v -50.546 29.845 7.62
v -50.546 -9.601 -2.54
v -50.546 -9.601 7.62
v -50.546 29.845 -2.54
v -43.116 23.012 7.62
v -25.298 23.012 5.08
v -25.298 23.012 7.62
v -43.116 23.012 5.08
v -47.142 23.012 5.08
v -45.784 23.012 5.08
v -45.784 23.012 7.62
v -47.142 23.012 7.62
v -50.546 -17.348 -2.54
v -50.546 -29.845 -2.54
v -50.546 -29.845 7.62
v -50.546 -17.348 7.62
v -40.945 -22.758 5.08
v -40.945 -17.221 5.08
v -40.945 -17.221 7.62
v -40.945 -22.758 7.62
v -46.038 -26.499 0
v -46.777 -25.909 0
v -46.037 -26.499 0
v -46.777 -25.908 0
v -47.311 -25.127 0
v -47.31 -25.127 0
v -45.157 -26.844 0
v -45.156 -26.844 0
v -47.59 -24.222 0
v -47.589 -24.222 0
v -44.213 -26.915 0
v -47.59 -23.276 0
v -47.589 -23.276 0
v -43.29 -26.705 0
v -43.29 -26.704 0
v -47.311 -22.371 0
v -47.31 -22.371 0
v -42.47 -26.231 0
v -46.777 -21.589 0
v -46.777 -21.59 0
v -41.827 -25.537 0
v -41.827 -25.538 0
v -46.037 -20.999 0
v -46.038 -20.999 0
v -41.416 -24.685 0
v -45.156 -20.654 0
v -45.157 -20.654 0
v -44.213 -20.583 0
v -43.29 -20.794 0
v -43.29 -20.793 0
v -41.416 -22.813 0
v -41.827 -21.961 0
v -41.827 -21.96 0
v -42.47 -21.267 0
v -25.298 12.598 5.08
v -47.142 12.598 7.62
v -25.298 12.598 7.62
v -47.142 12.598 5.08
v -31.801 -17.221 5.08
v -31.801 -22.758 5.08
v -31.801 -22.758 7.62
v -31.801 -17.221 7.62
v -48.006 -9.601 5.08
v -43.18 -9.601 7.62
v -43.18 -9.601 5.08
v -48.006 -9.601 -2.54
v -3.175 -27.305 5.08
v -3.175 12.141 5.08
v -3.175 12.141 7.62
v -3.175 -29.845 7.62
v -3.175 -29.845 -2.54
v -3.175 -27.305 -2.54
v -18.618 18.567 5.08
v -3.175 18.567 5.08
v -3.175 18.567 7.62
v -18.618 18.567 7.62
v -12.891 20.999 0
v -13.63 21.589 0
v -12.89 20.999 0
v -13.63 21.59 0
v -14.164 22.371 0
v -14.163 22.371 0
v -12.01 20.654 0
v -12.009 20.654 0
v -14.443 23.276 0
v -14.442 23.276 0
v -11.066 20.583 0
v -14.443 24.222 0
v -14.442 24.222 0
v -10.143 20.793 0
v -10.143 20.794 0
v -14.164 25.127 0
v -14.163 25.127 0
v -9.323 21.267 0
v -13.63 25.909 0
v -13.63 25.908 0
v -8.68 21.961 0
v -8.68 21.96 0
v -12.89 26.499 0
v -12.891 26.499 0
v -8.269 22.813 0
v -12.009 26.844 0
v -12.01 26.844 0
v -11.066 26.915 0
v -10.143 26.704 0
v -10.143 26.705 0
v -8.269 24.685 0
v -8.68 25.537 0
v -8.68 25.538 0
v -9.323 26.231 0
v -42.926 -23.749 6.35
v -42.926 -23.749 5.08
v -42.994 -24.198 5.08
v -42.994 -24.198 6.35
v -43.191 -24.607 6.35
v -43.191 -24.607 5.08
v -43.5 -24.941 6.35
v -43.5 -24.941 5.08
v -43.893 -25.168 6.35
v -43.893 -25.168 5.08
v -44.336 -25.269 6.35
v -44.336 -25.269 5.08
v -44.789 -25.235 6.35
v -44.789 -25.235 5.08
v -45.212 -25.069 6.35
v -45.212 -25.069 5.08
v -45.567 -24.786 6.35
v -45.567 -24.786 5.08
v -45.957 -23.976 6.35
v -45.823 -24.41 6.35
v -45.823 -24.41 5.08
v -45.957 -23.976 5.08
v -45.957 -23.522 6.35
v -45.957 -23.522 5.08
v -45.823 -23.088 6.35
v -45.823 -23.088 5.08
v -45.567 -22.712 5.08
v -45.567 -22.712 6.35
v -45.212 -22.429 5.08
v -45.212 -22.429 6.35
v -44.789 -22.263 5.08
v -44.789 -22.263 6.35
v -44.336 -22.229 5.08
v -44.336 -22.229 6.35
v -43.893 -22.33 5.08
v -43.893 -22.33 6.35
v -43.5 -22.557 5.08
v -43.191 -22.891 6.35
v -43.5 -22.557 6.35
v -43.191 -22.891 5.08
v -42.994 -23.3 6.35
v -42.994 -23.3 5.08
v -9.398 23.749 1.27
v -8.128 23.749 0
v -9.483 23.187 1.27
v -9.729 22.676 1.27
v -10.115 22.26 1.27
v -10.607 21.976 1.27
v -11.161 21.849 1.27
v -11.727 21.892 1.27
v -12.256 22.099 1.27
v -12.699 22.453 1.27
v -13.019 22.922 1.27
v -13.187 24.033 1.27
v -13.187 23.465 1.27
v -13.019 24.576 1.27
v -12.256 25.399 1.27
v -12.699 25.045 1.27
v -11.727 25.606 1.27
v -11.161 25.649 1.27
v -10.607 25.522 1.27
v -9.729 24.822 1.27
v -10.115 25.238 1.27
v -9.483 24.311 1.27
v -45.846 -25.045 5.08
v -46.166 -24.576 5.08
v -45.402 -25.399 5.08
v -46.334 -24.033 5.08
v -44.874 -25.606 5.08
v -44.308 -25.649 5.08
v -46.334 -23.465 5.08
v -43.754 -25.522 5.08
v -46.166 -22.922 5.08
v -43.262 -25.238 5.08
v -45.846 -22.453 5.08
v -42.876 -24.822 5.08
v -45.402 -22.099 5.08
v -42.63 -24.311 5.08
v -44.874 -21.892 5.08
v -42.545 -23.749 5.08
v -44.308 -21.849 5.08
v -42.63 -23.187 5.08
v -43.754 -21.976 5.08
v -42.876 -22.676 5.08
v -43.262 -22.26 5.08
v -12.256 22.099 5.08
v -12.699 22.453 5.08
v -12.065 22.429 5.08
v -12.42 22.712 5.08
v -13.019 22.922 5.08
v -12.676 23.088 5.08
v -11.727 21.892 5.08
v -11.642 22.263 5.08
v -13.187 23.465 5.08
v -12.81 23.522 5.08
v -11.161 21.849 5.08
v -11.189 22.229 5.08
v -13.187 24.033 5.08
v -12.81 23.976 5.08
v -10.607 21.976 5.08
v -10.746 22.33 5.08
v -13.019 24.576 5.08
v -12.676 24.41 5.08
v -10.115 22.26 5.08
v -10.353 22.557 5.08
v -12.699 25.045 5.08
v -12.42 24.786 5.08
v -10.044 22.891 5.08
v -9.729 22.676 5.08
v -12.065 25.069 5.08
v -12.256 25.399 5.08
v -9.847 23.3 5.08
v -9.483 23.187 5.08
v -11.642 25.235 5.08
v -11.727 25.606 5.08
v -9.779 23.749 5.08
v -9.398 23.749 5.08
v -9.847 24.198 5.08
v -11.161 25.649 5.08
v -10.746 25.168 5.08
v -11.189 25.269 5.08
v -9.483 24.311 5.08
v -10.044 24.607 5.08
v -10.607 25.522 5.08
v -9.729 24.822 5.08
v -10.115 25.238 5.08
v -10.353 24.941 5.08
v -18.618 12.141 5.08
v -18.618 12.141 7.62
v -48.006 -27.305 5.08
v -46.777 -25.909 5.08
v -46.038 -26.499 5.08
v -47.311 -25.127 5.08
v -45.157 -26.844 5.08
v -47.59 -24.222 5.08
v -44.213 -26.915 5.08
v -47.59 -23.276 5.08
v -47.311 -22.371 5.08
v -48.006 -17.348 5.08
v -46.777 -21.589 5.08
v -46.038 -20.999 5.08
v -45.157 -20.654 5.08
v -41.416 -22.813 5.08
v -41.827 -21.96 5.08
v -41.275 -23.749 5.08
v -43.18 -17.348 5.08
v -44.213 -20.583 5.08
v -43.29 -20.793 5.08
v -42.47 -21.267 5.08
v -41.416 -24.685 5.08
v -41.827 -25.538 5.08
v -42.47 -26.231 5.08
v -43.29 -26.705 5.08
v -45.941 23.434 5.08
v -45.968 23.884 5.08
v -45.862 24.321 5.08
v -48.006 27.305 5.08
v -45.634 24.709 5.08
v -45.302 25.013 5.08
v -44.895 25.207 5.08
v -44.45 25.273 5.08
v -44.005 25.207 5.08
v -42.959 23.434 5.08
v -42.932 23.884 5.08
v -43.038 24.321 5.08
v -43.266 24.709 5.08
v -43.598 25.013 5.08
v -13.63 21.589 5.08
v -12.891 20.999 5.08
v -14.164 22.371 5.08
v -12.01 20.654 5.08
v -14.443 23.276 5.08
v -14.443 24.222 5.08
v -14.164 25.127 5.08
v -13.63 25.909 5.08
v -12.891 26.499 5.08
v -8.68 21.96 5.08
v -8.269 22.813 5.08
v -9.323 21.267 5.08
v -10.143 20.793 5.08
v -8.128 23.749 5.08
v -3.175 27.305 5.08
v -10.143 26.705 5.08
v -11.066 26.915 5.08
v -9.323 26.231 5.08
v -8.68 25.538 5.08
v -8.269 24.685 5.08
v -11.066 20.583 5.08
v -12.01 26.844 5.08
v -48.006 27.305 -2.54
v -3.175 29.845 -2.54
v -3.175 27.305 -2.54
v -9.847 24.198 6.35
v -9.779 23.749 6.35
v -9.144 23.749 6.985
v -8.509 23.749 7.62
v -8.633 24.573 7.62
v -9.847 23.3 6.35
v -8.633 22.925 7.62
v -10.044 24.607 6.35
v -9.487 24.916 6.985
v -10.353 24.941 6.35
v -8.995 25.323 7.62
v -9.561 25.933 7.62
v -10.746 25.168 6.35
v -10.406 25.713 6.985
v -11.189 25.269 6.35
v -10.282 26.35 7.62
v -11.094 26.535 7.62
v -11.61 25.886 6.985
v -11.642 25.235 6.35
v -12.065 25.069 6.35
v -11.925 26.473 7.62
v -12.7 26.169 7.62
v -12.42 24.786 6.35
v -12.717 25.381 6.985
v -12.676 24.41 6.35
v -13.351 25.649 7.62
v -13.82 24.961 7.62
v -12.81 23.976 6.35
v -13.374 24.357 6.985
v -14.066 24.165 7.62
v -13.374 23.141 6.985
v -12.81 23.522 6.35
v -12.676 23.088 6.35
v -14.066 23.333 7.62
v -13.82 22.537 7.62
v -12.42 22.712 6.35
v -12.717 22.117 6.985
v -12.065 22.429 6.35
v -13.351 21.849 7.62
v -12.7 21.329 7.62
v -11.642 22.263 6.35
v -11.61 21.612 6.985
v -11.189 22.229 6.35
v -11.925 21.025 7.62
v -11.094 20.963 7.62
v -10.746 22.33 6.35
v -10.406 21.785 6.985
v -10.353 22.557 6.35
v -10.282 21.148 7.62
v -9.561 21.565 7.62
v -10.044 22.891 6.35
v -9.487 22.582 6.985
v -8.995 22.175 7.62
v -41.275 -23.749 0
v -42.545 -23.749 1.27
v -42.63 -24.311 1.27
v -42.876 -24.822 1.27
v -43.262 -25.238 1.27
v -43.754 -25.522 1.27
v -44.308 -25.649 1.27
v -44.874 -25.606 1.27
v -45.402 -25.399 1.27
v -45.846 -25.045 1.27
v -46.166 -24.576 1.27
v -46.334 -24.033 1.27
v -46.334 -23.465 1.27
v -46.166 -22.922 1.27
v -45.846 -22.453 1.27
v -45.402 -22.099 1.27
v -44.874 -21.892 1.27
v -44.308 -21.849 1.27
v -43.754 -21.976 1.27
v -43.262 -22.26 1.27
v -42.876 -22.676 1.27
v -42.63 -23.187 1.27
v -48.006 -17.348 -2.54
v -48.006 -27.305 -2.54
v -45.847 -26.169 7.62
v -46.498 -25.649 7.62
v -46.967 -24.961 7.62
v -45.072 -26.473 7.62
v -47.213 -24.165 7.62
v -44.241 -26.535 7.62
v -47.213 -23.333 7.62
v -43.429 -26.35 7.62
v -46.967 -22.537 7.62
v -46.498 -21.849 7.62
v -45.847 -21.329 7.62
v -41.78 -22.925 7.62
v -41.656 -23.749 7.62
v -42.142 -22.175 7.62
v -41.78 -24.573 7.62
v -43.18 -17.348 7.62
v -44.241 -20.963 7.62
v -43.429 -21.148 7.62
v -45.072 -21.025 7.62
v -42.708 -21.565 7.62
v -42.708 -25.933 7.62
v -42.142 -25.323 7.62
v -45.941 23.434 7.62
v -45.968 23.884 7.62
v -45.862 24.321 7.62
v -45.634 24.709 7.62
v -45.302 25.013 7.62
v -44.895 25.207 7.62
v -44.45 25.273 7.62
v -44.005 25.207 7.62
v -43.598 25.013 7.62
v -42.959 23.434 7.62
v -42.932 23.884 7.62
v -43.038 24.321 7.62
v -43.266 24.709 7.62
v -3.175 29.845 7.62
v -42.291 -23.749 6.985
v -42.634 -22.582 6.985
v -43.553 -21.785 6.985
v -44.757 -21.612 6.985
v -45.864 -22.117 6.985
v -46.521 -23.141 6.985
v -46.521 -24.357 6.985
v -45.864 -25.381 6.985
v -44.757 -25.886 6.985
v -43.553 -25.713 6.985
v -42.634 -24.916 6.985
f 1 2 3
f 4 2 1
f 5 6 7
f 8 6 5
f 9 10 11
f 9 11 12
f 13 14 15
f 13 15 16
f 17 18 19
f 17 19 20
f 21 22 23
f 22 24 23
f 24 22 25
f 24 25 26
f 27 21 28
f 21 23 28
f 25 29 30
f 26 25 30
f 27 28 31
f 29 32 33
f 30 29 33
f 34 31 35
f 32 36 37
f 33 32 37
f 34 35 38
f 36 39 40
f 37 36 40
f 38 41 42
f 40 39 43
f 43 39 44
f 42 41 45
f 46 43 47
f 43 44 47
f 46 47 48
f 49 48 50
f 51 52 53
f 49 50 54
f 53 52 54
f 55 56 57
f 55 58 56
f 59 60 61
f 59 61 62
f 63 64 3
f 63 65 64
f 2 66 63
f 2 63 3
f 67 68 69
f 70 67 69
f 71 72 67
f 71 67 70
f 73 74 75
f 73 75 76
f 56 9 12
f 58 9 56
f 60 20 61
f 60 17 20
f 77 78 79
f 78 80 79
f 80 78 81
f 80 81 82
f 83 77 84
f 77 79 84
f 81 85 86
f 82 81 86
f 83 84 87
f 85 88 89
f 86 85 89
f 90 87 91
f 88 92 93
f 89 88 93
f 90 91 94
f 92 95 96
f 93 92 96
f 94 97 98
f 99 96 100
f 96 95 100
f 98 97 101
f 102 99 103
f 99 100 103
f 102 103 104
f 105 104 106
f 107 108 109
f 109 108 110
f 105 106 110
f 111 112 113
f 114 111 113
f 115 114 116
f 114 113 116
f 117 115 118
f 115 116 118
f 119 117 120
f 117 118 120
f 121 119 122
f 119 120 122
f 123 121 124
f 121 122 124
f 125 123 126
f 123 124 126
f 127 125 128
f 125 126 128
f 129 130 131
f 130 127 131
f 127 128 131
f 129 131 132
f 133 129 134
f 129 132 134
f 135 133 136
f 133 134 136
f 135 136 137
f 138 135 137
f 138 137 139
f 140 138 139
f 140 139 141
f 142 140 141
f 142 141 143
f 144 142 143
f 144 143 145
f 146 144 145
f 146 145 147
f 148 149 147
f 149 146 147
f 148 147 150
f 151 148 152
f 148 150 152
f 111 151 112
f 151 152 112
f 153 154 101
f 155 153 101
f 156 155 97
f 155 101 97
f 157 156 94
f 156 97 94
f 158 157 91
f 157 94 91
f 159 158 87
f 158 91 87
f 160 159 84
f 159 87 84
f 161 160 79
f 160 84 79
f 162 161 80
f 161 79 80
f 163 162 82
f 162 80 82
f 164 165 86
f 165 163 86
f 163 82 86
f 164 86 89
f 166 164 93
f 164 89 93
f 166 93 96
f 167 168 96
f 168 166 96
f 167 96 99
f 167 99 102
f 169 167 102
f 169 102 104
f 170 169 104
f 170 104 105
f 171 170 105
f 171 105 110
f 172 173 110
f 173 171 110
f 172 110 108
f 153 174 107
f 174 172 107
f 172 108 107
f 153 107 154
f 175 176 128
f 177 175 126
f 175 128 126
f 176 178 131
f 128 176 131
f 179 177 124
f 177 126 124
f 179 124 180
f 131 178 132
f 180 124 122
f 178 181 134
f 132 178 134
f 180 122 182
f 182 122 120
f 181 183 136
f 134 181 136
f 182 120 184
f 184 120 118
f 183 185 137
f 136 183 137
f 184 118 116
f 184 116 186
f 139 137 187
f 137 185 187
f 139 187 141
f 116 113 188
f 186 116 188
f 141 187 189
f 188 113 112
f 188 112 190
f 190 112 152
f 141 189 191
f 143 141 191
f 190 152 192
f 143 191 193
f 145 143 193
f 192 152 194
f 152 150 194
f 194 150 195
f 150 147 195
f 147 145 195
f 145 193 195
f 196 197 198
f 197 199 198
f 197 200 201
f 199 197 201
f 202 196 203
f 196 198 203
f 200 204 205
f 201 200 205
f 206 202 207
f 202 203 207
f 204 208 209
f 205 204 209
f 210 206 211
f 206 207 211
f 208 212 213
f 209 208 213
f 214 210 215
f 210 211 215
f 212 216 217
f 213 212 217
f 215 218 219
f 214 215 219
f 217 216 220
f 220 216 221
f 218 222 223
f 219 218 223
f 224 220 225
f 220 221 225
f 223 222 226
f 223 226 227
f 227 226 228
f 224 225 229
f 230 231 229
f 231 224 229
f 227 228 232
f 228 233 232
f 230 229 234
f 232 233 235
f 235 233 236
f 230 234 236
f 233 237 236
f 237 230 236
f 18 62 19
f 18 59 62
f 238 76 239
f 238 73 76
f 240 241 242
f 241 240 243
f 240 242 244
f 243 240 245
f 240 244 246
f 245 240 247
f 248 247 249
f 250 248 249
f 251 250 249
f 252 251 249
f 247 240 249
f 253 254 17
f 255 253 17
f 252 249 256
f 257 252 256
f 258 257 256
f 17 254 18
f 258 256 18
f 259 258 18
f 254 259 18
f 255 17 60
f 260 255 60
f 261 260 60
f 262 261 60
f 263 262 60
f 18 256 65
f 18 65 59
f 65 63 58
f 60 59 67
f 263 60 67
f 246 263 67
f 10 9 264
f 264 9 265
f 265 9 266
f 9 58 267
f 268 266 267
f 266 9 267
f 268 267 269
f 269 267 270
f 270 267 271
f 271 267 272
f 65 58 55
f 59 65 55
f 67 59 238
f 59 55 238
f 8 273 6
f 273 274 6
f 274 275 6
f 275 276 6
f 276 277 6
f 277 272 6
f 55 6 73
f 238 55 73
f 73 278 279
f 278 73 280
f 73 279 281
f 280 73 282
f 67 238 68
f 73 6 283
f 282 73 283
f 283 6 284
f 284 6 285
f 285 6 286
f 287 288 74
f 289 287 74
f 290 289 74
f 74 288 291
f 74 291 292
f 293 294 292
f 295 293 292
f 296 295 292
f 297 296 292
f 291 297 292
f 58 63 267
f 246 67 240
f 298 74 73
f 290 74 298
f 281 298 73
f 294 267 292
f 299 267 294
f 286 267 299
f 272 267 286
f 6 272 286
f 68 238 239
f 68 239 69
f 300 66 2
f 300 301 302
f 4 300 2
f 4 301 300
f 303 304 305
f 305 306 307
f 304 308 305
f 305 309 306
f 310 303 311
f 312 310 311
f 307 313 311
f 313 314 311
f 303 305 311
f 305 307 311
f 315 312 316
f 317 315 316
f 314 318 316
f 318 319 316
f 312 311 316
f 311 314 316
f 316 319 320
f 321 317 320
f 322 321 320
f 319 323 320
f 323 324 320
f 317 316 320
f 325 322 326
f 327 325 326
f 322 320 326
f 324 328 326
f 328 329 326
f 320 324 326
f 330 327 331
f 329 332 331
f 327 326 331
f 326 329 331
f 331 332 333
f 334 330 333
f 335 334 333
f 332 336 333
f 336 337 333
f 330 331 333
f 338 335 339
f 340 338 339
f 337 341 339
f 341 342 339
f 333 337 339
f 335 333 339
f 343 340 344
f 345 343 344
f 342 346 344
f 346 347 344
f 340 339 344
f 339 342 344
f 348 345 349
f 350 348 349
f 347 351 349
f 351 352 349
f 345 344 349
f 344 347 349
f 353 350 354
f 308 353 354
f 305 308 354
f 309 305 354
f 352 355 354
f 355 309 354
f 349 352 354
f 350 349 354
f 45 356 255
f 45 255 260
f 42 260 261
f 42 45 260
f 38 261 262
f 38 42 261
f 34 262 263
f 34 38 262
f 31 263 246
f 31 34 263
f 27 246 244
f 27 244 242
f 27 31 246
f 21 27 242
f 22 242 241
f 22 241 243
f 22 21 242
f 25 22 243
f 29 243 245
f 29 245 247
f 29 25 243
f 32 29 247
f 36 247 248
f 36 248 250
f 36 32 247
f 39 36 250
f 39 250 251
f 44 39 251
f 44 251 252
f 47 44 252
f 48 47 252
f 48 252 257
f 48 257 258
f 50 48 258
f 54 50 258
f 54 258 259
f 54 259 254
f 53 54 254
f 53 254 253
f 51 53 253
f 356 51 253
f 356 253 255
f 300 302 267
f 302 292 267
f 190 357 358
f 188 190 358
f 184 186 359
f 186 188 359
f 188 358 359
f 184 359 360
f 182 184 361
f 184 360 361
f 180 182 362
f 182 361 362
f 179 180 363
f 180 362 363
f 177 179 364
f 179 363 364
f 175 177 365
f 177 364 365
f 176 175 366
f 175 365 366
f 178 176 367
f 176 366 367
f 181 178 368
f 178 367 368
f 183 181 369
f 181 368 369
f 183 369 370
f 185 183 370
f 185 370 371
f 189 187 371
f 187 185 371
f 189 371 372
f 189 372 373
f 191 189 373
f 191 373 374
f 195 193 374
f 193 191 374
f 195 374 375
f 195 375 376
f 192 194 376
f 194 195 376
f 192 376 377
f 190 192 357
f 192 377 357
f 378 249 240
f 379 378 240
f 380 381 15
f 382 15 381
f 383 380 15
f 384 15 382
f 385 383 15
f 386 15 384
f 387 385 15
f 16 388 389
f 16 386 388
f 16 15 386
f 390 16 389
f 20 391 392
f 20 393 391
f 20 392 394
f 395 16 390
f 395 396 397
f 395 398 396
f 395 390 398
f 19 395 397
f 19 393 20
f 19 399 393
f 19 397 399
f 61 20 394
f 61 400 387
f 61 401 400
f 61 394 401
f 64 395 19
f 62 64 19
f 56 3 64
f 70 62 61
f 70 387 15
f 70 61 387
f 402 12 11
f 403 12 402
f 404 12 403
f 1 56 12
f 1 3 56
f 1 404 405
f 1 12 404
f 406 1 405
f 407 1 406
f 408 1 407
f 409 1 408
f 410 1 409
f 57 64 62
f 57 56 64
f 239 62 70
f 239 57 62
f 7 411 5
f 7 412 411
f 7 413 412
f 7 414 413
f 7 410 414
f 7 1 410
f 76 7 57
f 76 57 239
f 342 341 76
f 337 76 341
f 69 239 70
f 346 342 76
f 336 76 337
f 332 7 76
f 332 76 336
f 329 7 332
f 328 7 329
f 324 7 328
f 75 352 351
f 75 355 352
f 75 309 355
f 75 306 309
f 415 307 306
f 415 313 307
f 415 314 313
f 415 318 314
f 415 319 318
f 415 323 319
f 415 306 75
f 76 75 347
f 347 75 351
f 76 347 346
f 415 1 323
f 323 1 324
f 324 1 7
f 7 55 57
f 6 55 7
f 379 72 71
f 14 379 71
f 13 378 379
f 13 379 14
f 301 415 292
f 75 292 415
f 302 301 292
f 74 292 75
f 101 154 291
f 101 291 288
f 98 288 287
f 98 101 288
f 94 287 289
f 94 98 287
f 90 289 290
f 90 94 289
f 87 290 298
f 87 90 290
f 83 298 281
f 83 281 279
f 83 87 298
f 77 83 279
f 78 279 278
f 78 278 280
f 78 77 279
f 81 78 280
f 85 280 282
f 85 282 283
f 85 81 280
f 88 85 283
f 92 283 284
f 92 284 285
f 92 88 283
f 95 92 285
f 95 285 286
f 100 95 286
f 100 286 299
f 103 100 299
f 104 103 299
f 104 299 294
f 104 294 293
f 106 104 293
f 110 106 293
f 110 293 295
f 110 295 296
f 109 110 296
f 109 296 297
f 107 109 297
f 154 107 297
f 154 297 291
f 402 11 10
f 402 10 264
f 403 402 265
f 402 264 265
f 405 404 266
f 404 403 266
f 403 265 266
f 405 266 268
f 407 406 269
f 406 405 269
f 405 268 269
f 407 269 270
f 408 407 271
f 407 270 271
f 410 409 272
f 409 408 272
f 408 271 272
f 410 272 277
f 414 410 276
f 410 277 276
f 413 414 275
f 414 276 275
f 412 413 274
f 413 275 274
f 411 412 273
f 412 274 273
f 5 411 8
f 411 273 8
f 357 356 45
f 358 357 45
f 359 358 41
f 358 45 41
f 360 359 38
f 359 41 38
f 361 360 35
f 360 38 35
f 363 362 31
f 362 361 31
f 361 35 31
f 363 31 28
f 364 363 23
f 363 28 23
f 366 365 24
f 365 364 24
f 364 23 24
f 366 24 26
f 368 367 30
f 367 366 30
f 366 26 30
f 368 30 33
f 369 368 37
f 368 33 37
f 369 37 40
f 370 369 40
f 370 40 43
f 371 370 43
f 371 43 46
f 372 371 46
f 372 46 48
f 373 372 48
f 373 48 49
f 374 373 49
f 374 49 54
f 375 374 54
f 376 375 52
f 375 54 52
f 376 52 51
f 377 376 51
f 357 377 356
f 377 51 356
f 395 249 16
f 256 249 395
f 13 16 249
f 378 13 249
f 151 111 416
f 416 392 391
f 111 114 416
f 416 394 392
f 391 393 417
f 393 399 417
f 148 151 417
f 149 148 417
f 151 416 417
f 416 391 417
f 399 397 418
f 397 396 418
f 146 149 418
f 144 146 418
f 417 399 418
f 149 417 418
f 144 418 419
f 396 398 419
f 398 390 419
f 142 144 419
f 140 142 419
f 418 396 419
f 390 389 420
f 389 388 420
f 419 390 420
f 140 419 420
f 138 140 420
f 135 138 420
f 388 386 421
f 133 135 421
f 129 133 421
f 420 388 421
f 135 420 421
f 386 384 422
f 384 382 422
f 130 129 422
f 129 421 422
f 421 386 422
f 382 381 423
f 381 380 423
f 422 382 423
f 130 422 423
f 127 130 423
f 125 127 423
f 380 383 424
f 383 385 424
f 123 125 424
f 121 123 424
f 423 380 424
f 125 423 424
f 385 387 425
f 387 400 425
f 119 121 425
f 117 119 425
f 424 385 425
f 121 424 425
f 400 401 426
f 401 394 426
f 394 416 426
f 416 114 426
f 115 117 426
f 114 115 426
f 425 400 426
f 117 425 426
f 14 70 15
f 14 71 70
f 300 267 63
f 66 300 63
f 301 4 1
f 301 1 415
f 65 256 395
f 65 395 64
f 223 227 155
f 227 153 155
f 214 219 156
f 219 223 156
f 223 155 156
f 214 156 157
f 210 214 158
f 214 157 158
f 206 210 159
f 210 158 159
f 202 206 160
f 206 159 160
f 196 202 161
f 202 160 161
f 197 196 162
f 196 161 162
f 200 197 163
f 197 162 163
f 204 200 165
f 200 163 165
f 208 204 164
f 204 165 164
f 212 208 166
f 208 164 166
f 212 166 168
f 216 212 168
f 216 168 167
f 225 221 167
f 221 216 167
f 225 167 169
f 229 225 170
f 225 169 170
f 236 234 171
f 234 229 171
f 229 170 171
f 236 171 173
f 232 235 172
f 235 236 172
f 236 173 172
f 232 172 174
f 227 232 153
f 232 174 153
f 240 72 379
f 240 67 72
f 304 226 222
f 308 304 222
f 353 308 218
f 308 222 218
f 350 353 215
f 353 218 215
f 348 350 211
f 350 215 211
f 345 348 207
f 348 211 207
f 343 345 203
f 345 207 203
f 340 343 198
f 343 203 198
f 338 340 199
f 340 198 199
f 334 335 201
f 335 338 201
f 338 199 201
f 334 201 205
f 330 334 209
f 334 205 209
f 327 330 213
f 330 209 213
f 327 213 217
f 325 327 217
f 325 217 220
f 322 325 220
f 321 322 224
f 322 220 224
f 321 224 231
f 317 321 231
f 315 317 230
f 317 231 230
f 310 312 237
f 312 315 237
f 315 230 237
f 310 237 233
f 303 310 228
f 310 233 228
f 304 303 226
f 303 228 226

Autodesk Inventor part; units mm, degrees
ref_plane "YZ Plane" through (0, 0, 0) normal (1, 0, 0) x (0, 1, 0)
ref_plane "XZ Plane" through (0, 0, 0) normal (0, 1, 0) x (-1, 0, 0)
ref_plane "XY Plane" through (0, 0, 0) normal (0, 0, 1) x (1, 0, 0)
ref_plane "Work Plane1" through (0, 0, 0) normal (0, 0, 1) x (1, 0, 0)
sketch "Sketch1" plane through (0, 0, 0) normal (0, 0, 1) x (1, 0, 0)
  line L0 (-4.2367, 12.7508) -> (-4.2367, 12.8143) projected
  line L1 (-4.2367, 12.8143) -> (-9.3167, 12.8143) projected
  line L2 (-9.3167, 12.8143) -> (-9.3167, 17.8943) projected
  line L3 (-9.3167, 17.8943) -> (-4.2367, 17.8943) projected
  line L4 (-4.2367, 17.8943) -> (-4.2367, 17.9578) projected
  line L5 (-4.2367, 17.9578) -> (-3.3223, 17.9578) projected
  line L6 (-3.3223, 17.9578) -> (-3.3223, 12.7508) projected
  line L7 (-3.3223, 12.7508) -> (-4.2367, 12.7508) projected
  line L8 (-13.0251, 13.6652) -> (-13.0251, 17.0434) projected
  arc A0 (-12.2631, 17.8054) -> (-13.0251, 17.0434) centre (-12.2631, 17.0434) ccw projected
  line L9 (-12.2631, 17.8054) -> (-11.3741, 17.8054) projected
  arc A1 (-10.6121, 17.0434) -> (-11.3741, 17.8054) centre (-11.3741, 17.0434) ccw projected
  line L10 (-10.6121, 17.0434) -> (-10.6121, 13.6652) projected
  arc A2 (-11.3741, 12.9032) -> (-10.6121, 13.6652) centre (-11.3741, 13.6652) ccw projected
  line L11 (-11.3741, 12.9032) -> (-12.2631, 12.9032) projected
  arc A3 (-13.0251, 13.6652) -> (-12.2631, 12.9032) centre (-12.2631, 13.6652) ccw projected
  line L12 (-15.4407, 13.6652) -> (-15.4407, 17.0434) projected
  arc A4 (-14.6787, 17.8054) -> (-15.4407, 17.0434) centre (-14.6787, 17.0434) ccw projected
  line L13 (-14.6787, 17.8054) -> (-13.7897, 17.8054) projected
  arc A5 (-13.0277, 17.0434) -> (-13.7897, 17.8054) centre (-13.7897, 17.0434) ccw projected
  line L14 (-13.0277, 17.0434) -> (-13.0277, 13.6652) projected
  arc A6 (-13.7897, 12.9032) -> (-13.0277, 13.6652) centre (-13.7897, 13.6652) ccw projected
  line L15 (-13.7897, 12.9032) -> (-14.6787, 12.9032) projected
  arc A7 (-15.4407, 13.6652) -> (-14.6787, 12.9032) centre (-14.6787, 13.6652) ccw projected
  line L16 (-17.8562, 13.6652) -> (-17.8562, 17.0434) projected
  arc A8 (-17.0942, 17.8054) -> (-17.8562, 17.0434) centre (-17.0942, 17.0434) ccw projected
  line L17 (-17.0942, 17.8054) -> (-16.2052, 17.8054) projected
  arc A9 (-15.4432, 17.0434) -> (-16.2052, 17.8054) centre (-16.2052, 17.0434) ccw projected
  line L18 (-15.4432, 17.0434) -> (-15.4432, 13.6652) projected
  arc A10 (-16.2052, 12.9032) -> (-15.4432, 13.6652) centre (-16.2052, 13.6652) ccw projected
  line L19 (-16.2052, 12.9032) -> (-17.0942, 12.9032) projected
  arc A11 (-17.8562, 13.6652) -> (-17.0942, 12.9032) centre (-17.0942, 13.6652) ccw projected
  line L20 (-46.3804, 22.2504) -> (-44.7271, 22.2504) projected
  arc A12 (-44.1729, 22.2504) -> (-44.7271, 22.2504) centre (-44.45, 23.749) ccw projected
  line L21 (-44.1729, 22.2504) -> (-26.0604, 22.2504) projected
  line L22 (-26.0604, 22.2504) -> (-26.0604, 13.3604) projected
  line L23 (-26.0604, 13.3604) -> (-46.3804, 13.3604) projected
  line L24 (-46.3804, 13.3604) -> (-46.3804, 22.2504) projected
  line L25 (-40.1828, -21.9964) -> (-40.1828, -17.9832) projected
  line L26 (-40.1828, -17.9832) -> (-32.5628, -17.9832) projected
  line L27 (-32.5628, -17.9832) -> (-32.5628, -21.9964) projected
  line L28 (-32.5628, -21.9964) -> (-40.1828, -21.9964) projected
  line L29 (-47.625, -10.3632) -> (-41.021, -10.3632) projected
  line L30 (-43.942, -10.668) -> (-43.942, -16.2814) projected
  line L31 (-41.021, -16.5862) -> (-47.625, -16.5862) projected
  line L32 (-47.625, -26.924) -> (-47.625, -16.5862) projected
  line L33 (-3.175, -26.924) -> (-47.625, -26.924) projected
  line L34 (-3.175, -14.224) -> (-3.175, -26.924) projected
  line L35 (3.175, -14.224) -> (-3.175, -14.224) projected
  line L36 (3.175, 14.224) -> (3.175, -14.224) projected
  line L37 (-3.175, 14.224) -> (3.175, 14.224) projected
  line L38 (-3.175, 26.924) -> (-3.175, 14.224) projected
  line L39 (-47.625, 26.924) -> (-3.175, 26.924) projected
  line L40 (-47.625, -10.3632) -> (-47.625, 26.924) projected
  circle A13 centre (0, 10.414) radius 1.524 projected
  circle A14 centre (0, -10.414) radius 1.524 projected
  circle A15 centre (-44.45, -23.749) radius 1.524 projected
  circle A16 centre (-11.303, 23.749) radius 1.524 projected
  circle A17 centre (-44.45, -23.749) radius 3.175
  circle A18 centre (-11.303, 23.749) radius 3.175
  line L41 (-41.021, -10.3632) -> (-41.021, -10.668) projected
  line L42 (-41.021, -10.668) -> (-43.942, -10.668) projected
  line L43 (-43.942, -16.2814) -> (-41.021, -16.2814) projected
  line L44 (-41.021, -16.2814) -> (-41.021, -16.5862) projected
  circle A19 centre (-44.45, -23.749) radius 1.905
  circle A20 centre (-11.303, 23.749) radius 1.905
  point P0 (0, 0)
  dimension "d32" = 1.27
  dimension "d33" = 0.381
extrude "Extrusion1" add sketch "Sketch1" along normal blind 5.08 contours A18 | A17
sketch "Sketch2" plane through (-11.303, 23.749, 5.08) normal (0, 0, 1) x (1, 0, 0)
  circle A0 centre (0, 0) radius 1.524 projected
  circle A1 centre (0, 0) radius 3.175 projected
  line L0 (-22.7076, -9.8806) -> (-15.2654, -9.8806) projected
  line L1 (-22.7076, -9.8806) -> (-22.7076, -10.3886) projected
  line L2 (-22.7076, -10.3886) -> (-14.7574, -10.3886) projected
  line L3 (-14.7574, -10.3886) -> (-14.7574, -1.4986) projected
  line L4 (-14.7574, -1.4986) -> (-35.0774, -1.4986) projected
  line L5 (-35.0774, -1.4986) -> (-35.0774, -10.3886) projected
  line L6 (-35.0774, -10.3886) -> (-27.1272, -10.3886) projected
  line L7 (-27.1272, -10.3886) -> (-27.1272, -9.8806) projected
  line L8 (-34.5694, -9.8806) -> (-27.1272, -9.8806) projected
  line L9 (-34.5694, -2.0066) -> (-34.5694, -9.8806) projected
  line L10 (-15.2654, -2.0066) -> (-34.5694, -2.0066) projected
  line L11 (-15.2654, -9.8806) -> (-15.2654, -2.0066) projected
  line L12 (-23.674, -42.693) -> (-24.1312, -42.0664) projected
  line L13 (-24.1312, -42.0664) -> (-24.1312, -40.565) projected
  line L14 (-24.1312, -40.565) -> (-17.2732, -40.565) projected
  line L15 (-17.2732, -40.565) -> (-17.2732, -42.0664) projected
  line L16 (-17.2732, -42.0664) -> (-17.7304, -42.693) projected
  line L17 (-17.7304, -42.693) -> (-17.7304, -43.8162) projected
  line L18 (-17.7304, -43.8162) -> (-23.674, -43.8162) projected
  line L19 (-23.674, -43.8162) -> (-23.674, -42.693) projected
  line L20 (-17.3494, -42.8172) -> (-16.8922, -42.1906) projected
  line L21 (-16.8922, -42.1906) -> (-16.8922, -40.184) projected
  line L22 (-16.8922, -40.184) -> (-24.5122, -40.184) projected
  line L23 (-24.5122, -40.184) -> (-24.5122, -42.1906) projected
  line L24 (-24.5122, -42.1906) -> (-24.055, -42.8172) projected
  line L25 (-24.055, -42.8172) -> (-24.055, -44.1972) projected
  line L26 (-24.055, -44.1972) -> (-17.3494, -44.1972) projected
  line L27 (-17.3494, -44.1972) -> (-17.3494, -42.8172) projected
  line L28 (-24.055, -44.1972) -> (-24.5122, -44.1972) projected
  line L29 (-24.055, -42.8172) -> (-24.055, -44.1972) projected
  line L30 (-24.5122, -42.1906) -> (-24.055, -42.8172) projected
  line L31 (-24.5122, -44.1972) -> (-24.5122, -42.1906) projected
  line L32 (-16.8922, -44.1972) -> (-17.3494, -44.1972) projected
  line L33 (-16.8922, -42.1906) -> (-16.8922, -44.1972) projected
  line L34 (-16.8922, -42.1906) -> (-17.3494, -42.8172) projected
  line L35 (-17.3494, -42.8172) -> (-17.3494, -44.1972) projected
  line L36 (-36.322, -40.3352) -> (-32.639, -40.3352) projected
  line L37 (-32.639, -40.3352) -> (-32.639, -34.1122) projected
  line L38 (-32.639, -34.1122) -> (-36.322, -34.1122) projected
  line L39 (-36.322, -34.1122) -> (-36.322, -40.3352) projected
  line L40 (-5.6642, -7.4422) -> (-5.6642, -6.8072) construction
  line L41 (-5.6642, -6.8072) -> (-5.0292, -6.8072) construction
  line L42 (-5.0292, -6.8072) -> (-5.0292, -7.4422) construction
  line L43 (-5.0292, -7.4422) -> (-5.6642, -7.4422) construction
  line L44 (-5.6642, -9.9822) -> (-5.6642, -9.3472) construction
  line L45 (-5.6642, -9.3472) -> (-5.0292, -9.3472) construction
  line L46 (-5.0292, -9.3472) -> (-5.0292, -9.9822) construction
  line L47 (-5.0292, -9.9822) -> (-5.6642, -9.9822) construction
  arc A2 (-4.1402, -6.7056) -> (-4.9022, -5.9436) centre (-4.9022, -6.7056) ccw construction
  line L48 (-4.9022, -5.9436) -> (-5.7912, -5.9436) construction
  arc A3 (-5.7912, -5.9436) -> (-6.5532, -6.7056) centre (-5.7912, -6.7056) ccw construction
  line L49 (-6.5532, -6.7056) -> (-6.5532, -10.0838) construction
  arc A4 (-6.5532, -10.0838) -> (-5.7912, -10.8458) centre (-5.7912, -10.0838) ccw construction
  line L50 (-5.7912, -10.8458) -> (-4.9022, -10.8458) construction
  arc A5 (-4.9022, -10.8458) -> (-4.1402, -10.0838) centre (-4.9022, -10.0838) ccw construction
  line L51 (-4.1402, -10.0838) -> (-4.1402, -6.7056) construction
  line L52 (-3.2487, -7.4422) -> (-3.2487, -6.8072) construction
  line L53 (-3.2487, -6.8072) -> (-2.6137, -6.8072) construction
  line L54 (-2.6137, -6.8072) -> (-2.6137, -7.4422) construction
  line L55 (-2.6137, -7.4422) -> (-3.2487, -7.4422) construction
  line L56 (-3.2487, -9.9822) -> (-3.2487, -9.3472) construction
  line L57 (-3.2487, -9.3472) -> (-2.6137, -9.3472) construction
  line L58 (-2.6137, -9.3472) -> (-2.6137, -9.9822) construction
  line L59 (-2.6137, -9.9822) -> (-3.2487, -9.9822) construction
  arc A6 (-1.7247, -6.7056) -> (-2.4867, -5.9436) centre (-2.4867, -6.7056) ccw construction
  line L60 (-2.4867, -5.9436) -> (-3.3757, -5.9436) construction
  arc A7 (-3.3757, -5.9436) -> (-4.1377, -6.7056) centre (-3.3757, -6.7056) ccw construction
  line L61 (-4.1377, -6.7056) -> (-4.1377, -10.0838) construction
  arc A8 (-4.1377, -10.0838) -> (-3.3757, -10.8458) centre (-3.3757, -10.0838) ccw construction
  line L62 (-3.3757, -10.8458) -> (-2.4867, -10.8458) construction
  arc A9 (-2.4867, -10.8458) -> (-1.7247, -10.0838) centre (-2.4867, -10.0838) ccw construction
  line L63 (-1.7247, -10.0838) -> (-1.7247, -6.7056) construction
  line L64 (-0.8331, -7.4422) -> (-0.8331, -6.8072) construction
  line L65 (-0.8331, -6.8072) -> (-0.1981, -6.8072) construction
  line L66 (-0.1981, -6.8072) -> (-0.1981, -7.4422) construction
  line L67 (-0.1981, -7.4422) -> (-0.8331, -7.4422) construction
  line L68 (-0.8331, -9.9822) -> (-0.8331, -9.3472) construction
  line L69 (-0.8331, -9.3472) -> (-0.1981, -9.3472) construction
  line L70 (-0.1981, -9.3472) -> (-0.1981, -9.9822) construction
  line L71 (-0.1981, -9.9822) -> (-0.8331, -9.9822) construction
  arc A10 (0.6909, -6.7056) -> (-0.0711, -5.9436) centre (-0.0711, -6.7056) ccw construction
  line L72 (-0.0711, -5.9436) -> (-0.9601, -5.9436) construction
  arc A11 (-0.9601, -5.9436) -> (-1.7221, -6.7056) centre (-0.9601, -6.7056) ccw construction
  line L73 (-1.7221, -6.7056) -> (-1.7221, -10.0838) construction
  arc A12 (-1.7221, -10.0838) -> (-0.9601, -10.8458) centre (-0.9601, -10.0838) ccw construction
  line L74 (-0.9601, -10.8458) -> (-0.0711, -10.8458) construction
  arc A13 (-0.0711, -10.8458) -> (0.6909, -10.0838) centre (-0.0711, -10.0838) ccw construction
  line L75 (0.6909, -10.0838) -> (0.6909, -6.7056) construction
  line L76 (4.2088, -9.3472) -> (4.8438, -9.3472) construction
  line L77 (4.8438, -9.3472) -> (4.8438, -9.9822) construction
  line L78 (4.8438, -9.9822) -> (4.2088, -9.9822) construction
  line L79 (4.2088, -9.9822) -> (4.2088, -9.3472) construction
  line L80 (4.8438, -6.8072) -> (4.8438, -7.4422) construction
  line L81 (4.8438, -7.4422) -> (4.2088, -7.4422) construction
  line L82 (4.2088, -7.4422) -> (4.2088, -6.8072) construction
  line L83 (4.2088, -6.8072) -> (4.8438, -6.8072) construction
  line L84 (7.0663, -5.8547) -> (1.9863, -5.8547) construction
  line L85 (1.9863, -5.8547) -> (1.9863, -10.9347) construction
  line L86 (1.9863, -10.9347) -> (7.0663, -10.9347) construction
  line L87 (7.0663, -10.9347) -> (7.0663, -5.8547) construction
  line L88 (7.0663, -7.0612) -> (7.9807, -7.0612) construction
  line L89 (7.9807, -5.7912) -> (7.9807, -7.0612) construction
  line L90 (7.0663, -5.7912) -> (7.9807, -5.7912) construction
  line L91 (7.0663, -5.7912) -> (7.0663, -7.0612) construction
  line L92 (7.9807, -9.7282) -> (7.0663, -9.7282) construction
  line L93 (7.0663, -9.7282) -> (7.0663, -10.9982) construction
  line L94 (7.0663, -10.9982) -> (7.9807, -10.9982) construction
  line L95 (7.9807, -9.7282) -> (7.9807, -10.9982) construction
  line L96 (7.9807, -5.7912) -> (7.9807, -10.9982) construction
  line L97 (14.478, -9.525) -> (14.478, -37.973) projected
  line L98 (14.478, -37.973) -> (8.128, -37.973) projected
  line L99 (8.128, -37.973) -> (8.128, -50.673) projected
  line L100 (8.128, -50.673) -> (-36.322, -50.673) projected
  line L101 (-36.322, -34.1122) -> (-36.322, 3.175) projected
  line L102 (-36.322, 3.175) -> (8.128, 3.175) projected
  line L103 (-22.7076, -10.3886) -> (-27.1272, -10.3886) projected
  line L104 (-14.7574, -10.3886) -> (-35.0774, -10.3886) projected
  line L105 (-14.7574, -1.4986) -> (-14.7574, -10.3886) projected
  line L106 (-14.7574, -1.4986) -> (-35.0774, -1.4986) projected
  line L107 (-35.8394, -11.1506) -> (-13.9954, -11.1506)
  line L108 (-13.9954, -11.1506) -> (-13.9954, -0.7366)
  line L109 (-13.9954, -0.7366) -> (-35.8394, -0.7366)
  line L110 (-35.8394, -0.7366) -> (-35.8394, -11.1506)
  line L111 (-29.6418, -46.5074) -> (-20.4978, -46.5074)
  line L112 (-20.4978, -46.5074) -> (-20.4978, -40.9702)
  line L113 (-20.4978, -40.9702) -> (-29.6418, -40.9702)
  line L114 (-29.6418, -40.9702) -> (-29.6418, -46.5074)
  line L115 (-7.3152, -11.6078) -> (8.128, -11.6078)
  line L116 (8.128, -5.1816) -> (-7.3152, -5.1816)
  line L117 (-7.3152, -5.1816) -> (-7.3152, -11.6078)
  line L118 (-31.877, -33.3502) -> (-39.243, -33.3502)
  line L119 (-39.243, -41.0972) -> (-31.877, -41.0972)
  line L120 (-31.877, -41.0972) -> (-31.877, -33.3502)
  line L121 (8.128, -53.594) -> (-39.243, -53.594)
  line L122 (-39.243, 6.096) -> (8.128, 6.096)
  circle A14 centre (-33.147, -47.498) radius 1.524 projected
  line L123 (7.0663, -10.9982) -> (7.0663, -10.9347) construction
  line L124 (7.0663, -10.9347) -> (1.9863, -10.9347) construction
  line L125 (1.9863, -10.9347) -> (1.9863, -5.8547) construction
  line L126 (1.9863, -5.8547) -> (7.0663, -5.8547) construction
  line L127 (7.0663, -5.8547) -> (7.0663, -5.7912) construction
  line L128 (7.0663, -5.7912) -> (7.9807, -5.7912) construction
  line L129 (7.9807, -5.7912) -> (7.9807, -10.9982) construction
  line L130 (7.9807, -10.9982) -> (7.0663, -10.9982) construction
  line L131 (-1.7221, -10.0838) -> (-1.7221, -6.7056) construction
  arc A15 (-0.9601, -5.9436) -> (-1.7221, -6.7056) centre (-0.9601, -6.7056) ccw construction
  line L132 (-0.9601, -5.9436) -> (-0.0711, -5.9436) construction
  arc A16 (0.6909, -6.7056) -> (-0.0711, -5.9436) centre (-0.0711, -6.7056) ccw construction
  line L133 (0.6909, -6.7056) -> (0.6909, -10.0838) construction
  arc A17 (-0.0711, -10.8458) -> (0.6909, -10.0838) centre (-0.0711, -10.0838) ccw construction
  line L134 (-0.0711, -10.8458) -> (-0.9601, -10.8458) construction
  arc A18 (-1.7221, -10.0838) -> (-0.9601, -10.8458) centre (-0.9601, -10.0838) ccw construction
  line L135 (-4.1377, -10.0838) -> (-4.1377, -6.7056) construction
  arc A19 (-3.3757, -5.9436) -> (-4.1377, -6.7056) centre (-3.3757, -6.7056) ccw construction
  line L136 (-3.3757, -5.9436) -> (-2.4867, -5.9436) construction
  arc A20 (-1.7247, -6.7056) -> (-2.4867, -5.9436) centre (-2.4867, -6.7056) ccw construction
  line L137 (-1.7247, -6.7056) -> (-1.7247, -10.0838) construction
  arc A21 (-2.4867, -10.8458) -> (-1.7247, -10.0838) centre (-2.4867, -10.0838) ccw construction
  line L138 (-2.4867, -10.8458) -> (-3.3757, -10.8458) construction
  arc A22 (-4.1377, -10.0838) -> (-3.3757, -10.8458) centre (-3.3757, -10.0838) ccw construction
  line L139 (-6.5532, -10.0838) -> (-6.5532, -6.7056) construction
  arc A23 (-5.7912, -5.9436) -> (-6.5532, -6.7056) centre (-5.7912, -6.7056) ccw construction
  line L140 (-5.7912, -5.9436) -> (-4.9022, -5.9436) construction
  arc A24 (-4.1402, -6.7056) -> (-4.9022, -5.9436) centre (-4.9022, -6.7056) ccw construction
  line L141 (-4.1402, -6.7056) -> (-4.1402, -10.0838) construction
  arc A25 (-4.9022, -10.8458) -> (-4.1402, -10.0838) centre (-4.9022, -10.0838) ccw construction
  line L142 (-4.9022, -10.8458) -> (-5.7912, -10.8458) construction
  arc A26 (-6.5532, -10.0838) -> (-5.7912, -10.8458) centre (-5.7912, -10.0838) ccw construction
  line L143 (-35.0774, -1.4986) -> (-33.4241, -1.4986) projected
  arc A27 (-32.8699, -1.4986) -> (-33.4241, -1.4986) centre (-33.147, 0) ccw projected
  line L144 (-32.8699, -1.4986) -> (-14.7574, -1.4986) projected
  line L145 (-14.7574, -1.4986) -> (-14.7574, -10.3886) projected
  line L146 (-14.7574, -10.3886) -> (-35.0774, -10.3886) projected
  line L147 (-35.0774, -10.3886) -> (-35.0774, -1.4986) projected
  line L148 (-24.5122, -44.1972) -> (-24.5122, -40.184) projected
  line L149 (-24.5122, -40.184) -> (-16.8922, -40.184) projected
  line L150 (-16.8922, -40.184) -> (-16.8922, -44.1972) projected
  line L151 (-16.8922, -44.1972) -> (-24.5122, -44.1972) projected
  line L152 (-36.322, -34.1122) -> (-32.639, -34.1122) projected
  line L153 (-32.639, -34.1122) -> (-32.639, -40.3352) projected
  line L154 (-32.639, -40.3352) -> (-36.322, -40.3352) projected
  line L155 (-36.322, -50.673) -> (-36.322, -40.3352) projected
  line L156 (8.128, -50.673) -> (-36.322, -50.673) projected
  line L157 (8.128, -37.973) -> (8.128, -50.673) projected
  line L158 (14.478, -37.973) -> (8.128, -37.973) projected
  line L159 (14.478, -9.525) -> (14.478, -37.973) projected
  line L160 (8.128, -9.525) -> (14.478, -9.525) projected
  line L161 (8.128, 3.175) -> (8.128, -9.525) projected
  line L162 (-36.322, 3.175) -> (8.128, 3.175) projected
  line L163 (-36.322, -34.1122) -> (-36.322, 3.175) projected
  circle A28 centre (11.303, -13.335) radius 1.524 projected
  circle A29 centre (11.303, -34.163) radius 1.524 projected
  circle A30 centre (-33.147, -47.498) radius 1.524 projected
  circle A31 centre (0, 0) radius 1.524 projected
  line L164 (8.128, 6.096) -> (8.128, -5.1816)
  line L165 (8.128, -11.6078) -> (8.128, -53.594)
  line L166 (-39.243, -53.594) -> (-39.243, -41.0972)
  line L167 (-39.243, -33.3502) -> (-39.243, 6.096)
  line L168 (-41.5103, -40.184) -> (-41.5103, -40.3352)
  line L169 (-28.8798, -41.7322) -> (-28.8798, -43.7388) projected
  line L170 (-21.2598, -41.7322) -> (-28.8798, -41.7322) projected
  line L171 (-28.4226, -45.7454) -> (-21.717, -45.7454) projected
  line L172 (-21.2598, -43.7388) -> (-21.2598, -45.7454) projected
  point P0 (11.303, -23.749)
  point P1 (-36.322, -38.9382)
  point P2 (-36.322, -35.5092)
  dimension "d3" = 0.762
  dimension "d4" = 0.762
  dimension "d5" = 0.762
  dimension "d6" = 0.762
  dimension "d7" = 0.762
  dimension "d8" = 0.762
  dimension "d9" = 0.762
  dimension "d10" = 0.762
  dimension "d11" = 0.762
  dimension "d12" = 0.762
  dimension "d18" = 2.921
  dimension "d19" = 2.921
  dimension "d28" = 0.762
  dimension "d29" = 0.762
  dimension "d30" = 0.762
  dimension "d31" = 0.762
extrude "Extrusion2" add sketch "Sketch2" along normal blind 2.54 contours A1 | L102 L161 L116 L117 L115 L165 L99 L100 L155 L119 L120 L118 L101 | L102 L101 L118 L167 L122 L164 | L155 L100 L165 L121 L166 L119 | L113 L23 L22 L21 L20 L27 L26 L112 L18 L17 L16 L15 L14 L13 | L13 L14 L15 L16 L17 L18 L112 L113 | L27 L20 L33 L32
sketch "Sketch3" plane through (-11.303, 23.749, 5.08) normal (0, 0, -1) x (-1, 0, 0)
  line L0 (-8.128, -5.1816) -> (-8.128, 6.096) projected
  line L1 (39.243, -53.594) -> (-8.128, -53.594) projected
  line L2 (39.243, -33.3502) -> (31.877, -33.3502) projected
  line L3 (39.243, 6.096) -> (39.243, -33.3502) projected
  line L4 (39.243, -41.0972) -> (36.703, -41.0972)
  line L5 (36.703, -41.0972) -> (36.703, -53.594)
  line L6 (36.703, -53.594) -> (39.243, -53.594)
  line L7 (39.243, -53.594) -> (39.243, -41.0972)
  line L8 (39.243, -53.594) -> (-8.128, -53.594) projected
  line L9 (-8.128, -53.594) -> (-8.128, -11.6078) projected
  line L10 (39.243, -53.594) -> (-8.128, -53.594)
  line L11 (-8.128, -53.594) -> (-8.128, -51.054)
  line L12 (-8.128, -51.054) -> (39.243, -51.054)
  line L13 (39.243, -51.054) -> (39.243, -53.594)
  line L14 (39.243, 6.096) -> (39.243, -33.3502) projected
  line L15 (39.243, 6.096) -> (36.703, 6.096)
  line L16 (36.703, 6.096) -> (36.703, -33.3502)
  line L17 (36.703, -33.3502) -> (39.243, -33.3502)
  line L18 (39.243, -33.3502) -> (39.243, 6.096)
  line L19 (39.243, 6.096) -> (-8.128, 6.096)
  line L20 (-8.128, 6.096) -> (-8.128, 3.556)
  line L21 (-8.128, 3.556) -> (39.243, 3.556)
  line L22 (39.243, 3.556) -> (39.243, 6.096)
  point P0 (-11.303, -23.749)
  dimension "d22" = 2.54
  dimension "d23" = 2.54
  dimension "d24" = 2.54
  dimension "d25" = 2.54
extrude "Extrusion3" add sketch "Sketch3" along normal blind 7.62
sketch "Sketch4" plane through (-11.303, 23.749, -2.54) normal (0, 0, -1) x (-1, 0, 0)
  line L0 (36.703, -51.054) -> (-8.128, -51.054) projected
  line L1 (-8.128, -51.054) -> (-8.128, -53.594) projected
  line L2 (-8.128, -53.594) -> (39.243, -53.594) projected
  line L3 (39.243, -53.594) -> (39.243, -41.0972) projected
  line L4 (39.243, -41.0972) -> (36.703, -41.0972) projected
  line L5 (36.703, -41.0972) -> (36.703, -51.054) projected
  point P0 (-11.303, -23.749)
chamfer "Chamfer1" distance 1.27 angle 45 4 edges at (-45.974, -23.749, 7.62) (-12.827, 23.749, 7.62) (-13.208, 23.749, 0) (-46.355, -23.749, 0)
equation "\"d4\" = d3"
equation "\"d5\" = d4"
equation "\"d6\" = d3"
equation "\"d7\" = d6"
equation "\"d8\" = d6"
equation "\"d9\" = d6"
equation "\"d10\" = d9"
equation "\"d11\" = d10"
equation "\"d12\" = d11"
equation "\"d18\" = d17"
equation "\"d19\" = d17"
equation "\"d28\" = d3"
equation "\"d29\" = d3"
equation "\"d30\" = d3"
equation "\"d31\" = d3"
equation "\"d23\" = d22"
equation "\"d17\" = 2.921"
properties part number "backCase"
